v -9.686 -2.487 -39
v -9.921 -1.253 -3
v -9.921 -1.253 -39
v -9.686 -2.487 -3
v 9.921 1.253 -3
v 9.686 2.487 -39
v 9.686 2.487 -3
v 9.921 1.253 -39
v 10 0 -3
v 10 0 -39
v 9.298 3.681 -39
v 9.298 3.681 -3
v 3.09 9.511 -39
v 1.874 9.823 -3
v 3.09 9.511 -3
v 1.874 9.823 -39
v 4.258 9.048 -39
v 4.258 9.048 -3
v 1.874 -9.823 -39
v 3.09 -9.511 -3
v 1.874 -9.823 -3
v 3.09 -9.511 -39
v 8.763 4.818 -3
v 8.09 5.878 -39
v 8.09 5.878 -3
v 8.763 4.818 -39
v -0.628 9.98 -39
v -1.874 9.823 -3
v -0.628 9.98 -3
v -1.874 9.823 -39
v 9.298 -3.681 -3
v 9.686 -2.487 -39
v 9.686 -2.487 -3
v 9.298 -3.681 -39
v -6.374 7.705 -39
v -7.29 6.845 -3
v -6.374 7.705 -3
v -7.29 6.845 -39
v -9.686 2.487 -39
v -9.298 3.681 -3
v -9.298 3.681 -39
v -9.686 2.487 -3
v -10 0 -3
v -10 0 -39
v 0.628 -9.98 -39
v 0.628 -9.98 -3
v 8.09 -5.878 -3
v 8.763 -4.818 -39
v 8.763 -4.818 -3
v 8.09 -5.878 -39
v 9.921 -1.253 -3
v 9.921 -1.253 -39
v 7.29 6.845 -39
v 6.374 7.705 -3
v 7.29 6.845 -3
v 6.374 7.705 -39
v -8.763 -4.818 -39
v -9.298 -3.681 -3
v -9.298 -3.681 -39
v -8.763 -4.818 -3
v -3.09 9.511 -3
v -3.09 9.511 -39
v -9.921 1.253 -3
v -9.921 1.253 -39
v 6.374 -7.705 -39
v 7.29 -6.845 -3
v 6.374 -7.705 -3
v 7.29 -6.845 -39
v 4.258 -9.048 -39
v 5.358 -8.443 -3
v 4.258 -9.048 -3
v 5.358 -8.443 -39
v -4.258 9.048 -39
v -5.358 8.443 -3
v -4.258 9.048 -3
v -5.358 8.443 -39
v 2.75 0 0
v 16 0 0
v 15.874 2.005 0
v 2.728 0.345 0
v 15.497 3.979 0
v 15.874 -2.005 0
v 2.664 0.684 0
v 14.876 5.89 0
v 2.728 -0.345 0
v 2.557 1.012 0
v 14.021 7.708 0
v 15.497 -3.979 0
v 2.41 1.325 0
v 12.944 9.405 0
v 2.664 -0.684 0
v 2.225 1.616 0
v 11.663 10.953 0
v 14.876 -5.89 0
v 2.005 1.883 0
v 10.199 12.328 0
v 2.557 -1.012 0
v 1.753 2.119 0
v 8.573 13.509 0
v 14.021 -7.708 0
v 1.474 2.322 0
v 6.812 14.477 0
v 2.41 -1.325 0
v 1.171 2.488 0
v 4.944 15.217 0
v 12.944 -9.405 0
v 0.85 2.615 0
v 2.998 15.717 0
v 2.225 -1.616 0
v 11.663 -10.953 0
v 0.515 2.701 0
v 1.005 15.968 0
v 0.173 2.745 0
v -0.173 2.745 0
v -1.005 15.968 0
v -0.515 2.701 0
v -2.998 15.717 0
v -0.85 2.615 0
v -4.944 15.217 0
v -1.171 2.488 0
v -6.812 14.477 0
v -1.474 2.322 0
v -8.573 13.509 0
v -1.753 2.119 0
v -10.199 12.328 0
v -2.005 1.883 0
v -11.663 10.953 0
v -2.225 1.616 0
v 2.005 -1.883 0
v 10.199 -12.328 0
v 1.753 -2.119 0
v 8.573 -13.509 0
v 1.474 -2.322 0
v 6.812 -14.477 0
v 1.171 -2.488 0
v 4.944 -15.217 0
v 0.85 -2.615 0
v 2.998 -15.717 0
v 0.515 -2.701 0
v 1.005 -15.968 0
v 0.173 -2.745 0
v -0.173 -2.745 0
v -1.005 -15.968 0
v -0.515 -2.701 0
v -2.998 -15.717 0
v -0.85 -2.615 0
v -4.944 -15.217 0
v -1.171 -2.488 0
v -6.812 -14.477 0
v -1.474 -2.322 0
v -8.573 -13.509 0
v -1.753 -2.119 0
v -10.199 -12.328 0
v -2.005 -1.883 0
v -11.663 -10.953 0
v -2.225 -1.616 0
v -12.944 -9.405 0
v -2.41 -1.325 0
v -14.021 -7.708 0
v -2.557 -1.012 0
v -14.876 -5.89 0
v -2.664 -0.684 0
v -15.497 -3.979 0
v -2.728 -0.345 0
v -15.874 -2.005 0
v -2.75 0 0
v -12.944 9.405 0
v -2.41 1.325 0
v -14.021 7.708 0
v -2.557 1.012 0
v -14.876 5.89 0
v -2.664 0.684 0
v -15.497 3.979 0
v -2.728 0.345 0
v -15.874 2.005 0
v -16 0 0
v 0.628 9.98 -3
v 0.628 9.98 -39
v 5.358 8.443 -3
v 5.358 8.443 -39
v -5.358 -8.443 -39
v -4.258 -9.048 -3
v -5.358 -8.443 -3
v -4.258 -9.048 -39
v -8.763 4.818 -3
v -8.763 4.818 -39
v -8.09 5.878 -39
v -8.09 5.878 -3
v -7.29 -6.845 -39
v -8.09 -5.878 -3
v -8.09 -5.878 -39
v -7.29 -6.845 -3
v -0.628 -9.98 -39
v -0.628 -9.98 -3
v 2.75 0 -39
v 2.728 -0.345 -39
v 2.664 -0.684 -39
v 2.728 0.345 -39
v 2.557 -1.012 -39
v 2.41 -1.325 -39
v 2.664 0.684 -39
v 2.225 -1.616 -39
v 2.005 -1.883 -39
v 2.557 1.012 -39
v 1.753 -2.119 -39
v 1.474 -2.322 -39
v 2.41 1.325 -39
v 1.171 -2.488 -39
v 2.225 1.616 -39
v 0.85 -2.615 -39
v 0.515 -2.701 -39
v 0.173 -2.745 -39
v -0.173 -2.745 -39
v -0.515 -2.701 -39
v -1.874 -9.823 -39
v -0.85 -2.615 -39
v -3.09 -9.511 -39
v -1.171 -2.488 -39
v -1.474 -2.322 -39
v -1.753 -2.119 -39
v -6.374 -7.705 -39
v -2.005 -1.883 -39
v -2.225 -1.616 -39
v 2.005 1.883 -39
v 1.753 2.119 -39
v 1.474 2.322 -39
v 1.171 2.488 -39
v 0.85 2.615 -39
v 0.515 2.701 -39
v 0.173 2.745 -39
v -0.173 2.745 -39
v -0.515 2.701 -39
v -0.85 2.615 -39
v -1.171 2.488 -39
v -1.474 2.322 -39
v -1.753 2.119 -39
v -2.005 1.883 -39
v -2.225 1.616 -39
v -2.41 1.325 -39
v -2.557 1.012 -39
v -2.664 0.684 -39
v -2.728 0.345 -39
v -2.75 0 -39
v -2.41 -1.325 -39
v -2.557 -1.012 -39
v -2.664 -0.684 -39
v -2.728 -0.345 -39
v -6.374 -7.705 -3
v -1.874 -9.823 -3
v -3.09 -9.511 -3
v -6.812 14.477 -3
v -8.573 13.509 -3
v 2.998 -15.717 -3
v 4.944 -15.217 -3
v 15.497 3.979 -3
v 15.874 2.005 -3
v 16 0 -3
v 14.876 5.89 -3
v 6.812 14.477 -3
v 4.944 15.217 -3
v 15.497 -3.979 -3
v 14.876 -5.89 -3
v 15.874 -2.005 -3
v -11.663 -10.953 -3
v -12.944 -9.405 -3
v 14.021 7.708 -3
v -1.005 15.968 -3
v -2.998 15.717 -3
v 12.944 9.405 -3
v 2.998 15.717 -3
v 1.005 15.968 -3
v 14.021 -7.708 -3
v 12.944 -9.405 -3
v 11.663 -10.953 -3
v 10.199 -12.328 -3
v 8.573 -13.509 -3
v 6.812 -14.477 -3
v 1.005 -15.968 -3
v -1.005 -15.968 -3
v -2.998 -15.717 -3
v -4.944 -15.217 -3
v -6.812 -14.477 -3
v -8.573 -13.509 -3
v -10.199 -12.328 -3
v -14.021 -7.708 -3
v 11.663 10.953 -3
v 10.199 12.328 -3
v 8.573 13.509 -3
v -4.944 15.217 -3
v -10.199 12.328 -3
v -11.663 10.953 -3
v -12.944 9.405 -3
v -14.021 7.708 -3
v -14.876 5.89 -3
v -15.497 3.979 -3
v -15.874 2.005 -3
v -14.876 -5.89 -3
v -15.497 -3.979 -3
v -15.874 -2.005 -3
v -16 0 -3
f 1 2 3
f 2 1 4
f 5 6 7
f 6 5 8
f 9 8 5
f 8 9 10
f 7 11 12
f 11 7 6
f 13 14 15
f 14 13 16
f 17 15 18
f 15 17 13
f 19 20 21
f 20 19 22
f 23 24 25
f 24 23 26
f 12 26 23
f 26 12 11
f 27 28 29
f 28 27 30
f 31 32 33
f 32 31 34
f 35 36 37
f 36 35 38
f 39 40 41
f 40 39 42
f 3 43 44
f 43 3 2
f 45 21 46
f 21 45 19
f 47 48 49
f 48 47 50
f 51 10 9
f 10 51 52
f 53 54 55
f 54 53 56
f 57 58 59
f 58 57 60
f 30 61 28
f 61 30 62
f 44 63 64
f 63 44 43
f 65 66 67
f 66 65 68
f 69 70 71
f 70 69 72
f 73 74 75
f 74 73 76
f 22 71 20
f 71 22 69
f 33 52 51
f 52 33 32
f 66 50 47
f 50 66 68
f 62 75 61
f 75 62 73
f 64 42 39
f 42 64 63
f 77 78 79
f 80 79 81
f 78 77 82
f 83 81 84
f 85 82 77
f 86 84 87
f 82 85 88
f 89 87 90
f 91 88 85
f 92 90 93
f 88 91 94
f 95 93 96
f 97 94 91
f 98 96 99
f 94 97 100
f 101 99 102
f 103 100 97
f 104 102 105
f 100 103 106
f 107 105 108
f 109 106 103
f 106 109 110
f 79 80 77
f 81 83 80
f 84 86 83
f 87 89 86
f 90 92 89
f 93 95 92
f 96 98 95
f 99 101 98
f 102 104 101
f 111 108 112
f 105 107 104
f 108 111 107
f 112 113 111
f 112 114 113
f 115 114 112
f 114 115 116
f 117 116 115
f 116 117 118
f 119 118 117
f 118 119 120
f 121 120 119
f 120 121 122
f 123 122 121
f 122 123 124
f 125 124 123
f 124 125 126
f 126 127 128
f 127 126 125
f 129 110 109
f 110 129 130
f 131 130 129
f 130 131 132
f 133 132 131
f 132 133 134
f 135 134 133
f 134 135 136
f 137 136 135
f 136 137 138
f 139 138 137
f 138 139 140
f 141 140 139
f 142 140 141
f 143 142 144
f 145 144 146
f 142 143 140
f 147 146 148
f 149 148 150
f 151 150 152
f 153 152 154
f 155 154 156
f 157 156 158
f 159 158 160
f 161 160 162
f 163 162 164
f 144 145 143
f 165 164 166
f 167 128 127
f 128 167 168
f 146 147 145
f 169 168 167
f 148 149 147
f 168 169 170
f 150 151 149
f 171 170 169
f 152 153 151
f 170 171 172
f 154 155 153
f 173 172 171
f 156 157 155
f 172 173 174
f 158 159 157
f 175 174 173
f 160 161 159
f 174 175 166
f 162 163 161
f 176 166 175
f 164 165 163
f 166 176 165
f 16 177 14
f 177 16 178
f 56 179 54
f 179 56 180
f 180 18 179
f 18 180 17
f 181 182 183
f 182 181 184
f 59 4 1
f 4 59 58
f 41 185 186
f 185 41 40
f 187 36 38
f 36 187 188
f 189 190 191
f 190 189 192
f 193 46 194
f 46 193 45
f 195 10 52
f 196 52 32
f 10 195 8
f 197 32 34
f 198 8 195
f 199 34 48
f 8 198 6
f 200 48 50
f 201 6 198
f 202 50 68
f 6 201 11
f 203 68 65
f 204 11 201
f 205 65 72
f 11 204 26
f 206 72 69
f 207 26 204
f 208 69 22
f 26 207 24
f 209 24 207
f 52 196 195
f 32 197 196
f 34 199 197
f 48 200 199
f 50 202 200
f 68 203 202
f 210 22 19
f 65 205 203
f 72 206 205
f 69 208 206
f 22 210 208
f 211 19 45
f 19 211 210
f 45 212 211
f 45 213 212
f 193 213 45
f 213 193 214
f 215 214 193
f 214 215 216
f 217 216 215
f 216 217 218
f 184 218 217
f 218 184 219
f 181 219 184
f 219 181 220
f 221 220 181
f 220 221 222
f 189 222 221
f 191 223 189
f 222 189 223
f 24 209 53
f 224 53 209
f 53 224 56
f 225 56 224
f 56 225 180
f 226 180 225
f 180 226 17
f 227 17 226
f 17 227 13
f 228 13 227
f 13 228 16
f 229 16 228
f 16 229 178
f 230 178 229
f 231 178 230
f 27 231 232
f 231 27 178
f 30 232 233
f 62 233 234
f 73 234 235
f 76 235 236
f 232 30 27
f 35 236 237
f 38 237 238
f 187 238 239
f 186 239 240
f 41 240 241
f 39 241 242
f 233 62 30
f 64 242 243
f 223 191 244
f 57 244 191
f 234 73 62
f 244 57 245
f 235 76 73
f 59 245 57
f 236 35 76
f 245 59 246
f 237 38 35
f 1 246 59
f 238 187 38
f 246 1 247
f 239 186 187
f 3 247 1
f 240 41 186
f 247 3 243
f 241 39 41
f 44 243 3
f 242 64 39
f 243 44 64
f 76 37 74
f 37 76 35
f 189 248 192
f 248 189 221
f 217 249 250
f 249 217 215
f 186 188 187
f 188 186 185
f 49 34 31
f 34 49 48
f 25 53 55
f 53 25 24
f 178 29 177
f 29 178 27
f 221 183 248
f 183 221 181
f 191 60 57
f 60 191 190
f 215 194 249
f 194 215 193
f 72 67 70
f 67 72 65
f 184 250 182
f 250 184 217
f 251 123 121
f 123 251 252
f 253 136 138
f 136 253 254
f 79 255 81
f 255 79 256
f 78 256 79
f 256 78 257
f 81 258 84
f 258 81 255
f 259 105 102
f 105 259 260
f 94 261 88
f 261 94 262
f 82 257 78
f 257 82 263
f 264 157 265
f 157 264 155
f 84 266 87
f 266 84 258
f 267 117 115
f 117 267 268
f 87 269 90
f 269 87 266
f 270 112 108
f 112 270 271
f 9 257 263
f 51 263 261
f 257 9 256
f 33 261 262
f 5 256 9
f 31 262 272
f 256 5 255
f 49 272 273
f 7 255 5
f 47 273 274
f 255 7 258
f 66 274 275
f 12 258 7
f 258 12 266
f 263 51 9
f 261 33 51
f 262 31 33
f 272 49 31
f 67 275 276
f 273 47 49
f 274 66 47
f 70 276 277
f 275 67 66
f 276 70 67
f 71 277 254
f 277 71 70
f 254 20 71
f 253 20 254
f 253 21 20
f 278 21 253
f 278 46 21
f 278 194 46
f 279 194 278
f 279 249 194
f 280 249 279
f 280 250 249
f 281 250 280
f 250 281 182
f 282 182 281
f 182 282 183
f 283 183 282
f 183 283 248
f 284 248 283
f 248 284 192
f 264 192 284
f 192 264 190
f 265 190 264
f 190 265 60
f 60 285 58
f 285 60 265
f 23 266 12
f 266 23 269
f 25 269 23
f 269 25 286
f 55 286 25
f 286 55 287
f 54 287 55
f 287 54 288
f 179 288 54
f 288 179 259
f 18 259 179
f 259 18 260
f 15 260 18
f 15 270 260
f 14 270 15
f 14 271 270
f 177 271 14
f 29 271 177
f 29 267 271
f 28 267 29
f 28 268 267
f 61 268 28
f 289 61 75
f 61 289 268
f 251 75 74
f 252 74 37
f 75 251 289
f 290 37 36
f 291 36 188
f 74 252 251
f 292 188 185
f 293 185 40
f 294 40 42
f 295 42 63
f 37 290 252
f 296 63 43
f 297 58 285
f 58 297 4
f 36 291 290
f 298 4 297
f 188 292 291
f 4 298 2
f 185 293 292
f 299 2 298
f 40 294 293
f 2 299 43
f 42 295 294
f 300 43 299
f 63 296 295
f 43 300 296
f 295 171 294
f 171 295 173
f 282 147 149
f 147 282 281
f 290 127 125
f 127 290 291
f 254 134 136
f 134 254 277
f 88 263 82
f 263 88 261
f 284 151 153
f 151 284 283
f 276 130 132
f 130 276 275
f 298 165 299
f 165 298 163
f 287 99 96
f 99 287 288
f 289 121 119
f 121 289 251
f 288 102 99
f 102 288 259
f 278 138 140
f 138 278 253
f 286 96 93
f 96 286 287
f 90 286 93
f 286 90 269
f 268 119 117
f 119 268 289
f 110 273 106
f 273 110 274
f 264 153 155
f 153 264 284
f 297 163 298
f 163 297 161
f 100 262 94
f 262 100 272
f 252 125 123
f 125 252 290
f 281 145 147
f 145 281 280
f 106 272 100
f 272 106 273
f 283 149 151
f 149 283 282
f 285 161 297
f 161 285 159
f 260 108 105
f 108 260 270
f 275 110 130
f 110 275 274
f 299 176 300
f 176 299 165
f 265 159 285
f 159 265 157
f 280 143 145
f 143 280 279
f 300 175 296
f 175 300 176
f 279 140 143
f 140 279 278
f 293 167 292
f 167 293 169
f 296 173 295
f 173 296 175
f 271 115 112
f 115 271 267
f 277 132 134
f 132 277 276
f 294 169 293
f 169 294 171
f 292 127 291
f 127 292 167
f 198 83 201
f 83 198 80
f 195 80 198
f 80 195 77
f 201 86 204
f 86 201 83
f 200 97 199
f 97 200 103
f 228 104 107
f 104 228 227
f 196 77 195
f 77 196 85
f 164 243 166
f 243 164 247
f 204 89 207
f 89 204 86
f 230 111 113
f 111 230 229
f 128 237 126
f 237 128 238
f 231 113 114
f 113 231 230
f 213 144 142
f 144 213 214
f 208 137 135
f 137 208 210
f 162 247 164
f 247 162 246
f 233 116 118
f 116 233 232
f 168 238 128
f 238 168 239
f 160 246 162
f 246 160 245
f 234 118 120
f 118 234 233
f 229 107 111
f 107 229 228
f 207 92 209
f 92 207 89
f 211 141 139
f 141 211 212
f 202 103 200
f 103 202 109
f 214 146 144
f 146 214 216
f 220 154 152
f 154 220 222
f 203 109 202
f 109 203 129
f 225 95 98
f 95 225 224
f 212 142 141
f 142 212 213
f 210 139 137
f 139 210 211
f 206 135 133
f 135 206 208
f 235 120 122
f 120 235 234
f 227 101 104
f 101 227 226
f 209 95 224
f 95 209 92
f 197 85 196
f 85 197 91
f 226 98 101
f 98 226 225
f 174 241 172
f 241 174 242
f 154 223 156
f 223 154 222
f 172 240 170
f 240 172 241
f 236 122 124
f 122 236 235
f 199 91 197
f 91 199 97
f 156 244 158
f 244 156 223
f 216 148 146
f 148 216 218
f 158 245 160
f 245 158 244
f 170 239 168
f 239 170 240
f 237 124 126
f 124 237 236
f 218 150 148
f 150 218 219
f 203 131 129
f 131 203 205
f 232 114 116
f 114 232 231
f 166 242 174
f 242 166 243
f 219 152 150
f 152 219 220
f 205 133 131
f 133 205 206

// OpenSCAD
$fn = 50;


difference() {
	union() {
		translate(v = [0, 0, -39.0000000000]) {
			cylinder(h = 39, r = 10.0000000000);
		}
		translate(v = [0, 0, -3.0000000000]) {
			cylinder(h = 3, r = 16.0000000000);
		}
	}
	union() {
		#translate(v = [0, 0, -39]) {
			cylinder(h = 39, r = 2.7500000000);
		}
	}
}
